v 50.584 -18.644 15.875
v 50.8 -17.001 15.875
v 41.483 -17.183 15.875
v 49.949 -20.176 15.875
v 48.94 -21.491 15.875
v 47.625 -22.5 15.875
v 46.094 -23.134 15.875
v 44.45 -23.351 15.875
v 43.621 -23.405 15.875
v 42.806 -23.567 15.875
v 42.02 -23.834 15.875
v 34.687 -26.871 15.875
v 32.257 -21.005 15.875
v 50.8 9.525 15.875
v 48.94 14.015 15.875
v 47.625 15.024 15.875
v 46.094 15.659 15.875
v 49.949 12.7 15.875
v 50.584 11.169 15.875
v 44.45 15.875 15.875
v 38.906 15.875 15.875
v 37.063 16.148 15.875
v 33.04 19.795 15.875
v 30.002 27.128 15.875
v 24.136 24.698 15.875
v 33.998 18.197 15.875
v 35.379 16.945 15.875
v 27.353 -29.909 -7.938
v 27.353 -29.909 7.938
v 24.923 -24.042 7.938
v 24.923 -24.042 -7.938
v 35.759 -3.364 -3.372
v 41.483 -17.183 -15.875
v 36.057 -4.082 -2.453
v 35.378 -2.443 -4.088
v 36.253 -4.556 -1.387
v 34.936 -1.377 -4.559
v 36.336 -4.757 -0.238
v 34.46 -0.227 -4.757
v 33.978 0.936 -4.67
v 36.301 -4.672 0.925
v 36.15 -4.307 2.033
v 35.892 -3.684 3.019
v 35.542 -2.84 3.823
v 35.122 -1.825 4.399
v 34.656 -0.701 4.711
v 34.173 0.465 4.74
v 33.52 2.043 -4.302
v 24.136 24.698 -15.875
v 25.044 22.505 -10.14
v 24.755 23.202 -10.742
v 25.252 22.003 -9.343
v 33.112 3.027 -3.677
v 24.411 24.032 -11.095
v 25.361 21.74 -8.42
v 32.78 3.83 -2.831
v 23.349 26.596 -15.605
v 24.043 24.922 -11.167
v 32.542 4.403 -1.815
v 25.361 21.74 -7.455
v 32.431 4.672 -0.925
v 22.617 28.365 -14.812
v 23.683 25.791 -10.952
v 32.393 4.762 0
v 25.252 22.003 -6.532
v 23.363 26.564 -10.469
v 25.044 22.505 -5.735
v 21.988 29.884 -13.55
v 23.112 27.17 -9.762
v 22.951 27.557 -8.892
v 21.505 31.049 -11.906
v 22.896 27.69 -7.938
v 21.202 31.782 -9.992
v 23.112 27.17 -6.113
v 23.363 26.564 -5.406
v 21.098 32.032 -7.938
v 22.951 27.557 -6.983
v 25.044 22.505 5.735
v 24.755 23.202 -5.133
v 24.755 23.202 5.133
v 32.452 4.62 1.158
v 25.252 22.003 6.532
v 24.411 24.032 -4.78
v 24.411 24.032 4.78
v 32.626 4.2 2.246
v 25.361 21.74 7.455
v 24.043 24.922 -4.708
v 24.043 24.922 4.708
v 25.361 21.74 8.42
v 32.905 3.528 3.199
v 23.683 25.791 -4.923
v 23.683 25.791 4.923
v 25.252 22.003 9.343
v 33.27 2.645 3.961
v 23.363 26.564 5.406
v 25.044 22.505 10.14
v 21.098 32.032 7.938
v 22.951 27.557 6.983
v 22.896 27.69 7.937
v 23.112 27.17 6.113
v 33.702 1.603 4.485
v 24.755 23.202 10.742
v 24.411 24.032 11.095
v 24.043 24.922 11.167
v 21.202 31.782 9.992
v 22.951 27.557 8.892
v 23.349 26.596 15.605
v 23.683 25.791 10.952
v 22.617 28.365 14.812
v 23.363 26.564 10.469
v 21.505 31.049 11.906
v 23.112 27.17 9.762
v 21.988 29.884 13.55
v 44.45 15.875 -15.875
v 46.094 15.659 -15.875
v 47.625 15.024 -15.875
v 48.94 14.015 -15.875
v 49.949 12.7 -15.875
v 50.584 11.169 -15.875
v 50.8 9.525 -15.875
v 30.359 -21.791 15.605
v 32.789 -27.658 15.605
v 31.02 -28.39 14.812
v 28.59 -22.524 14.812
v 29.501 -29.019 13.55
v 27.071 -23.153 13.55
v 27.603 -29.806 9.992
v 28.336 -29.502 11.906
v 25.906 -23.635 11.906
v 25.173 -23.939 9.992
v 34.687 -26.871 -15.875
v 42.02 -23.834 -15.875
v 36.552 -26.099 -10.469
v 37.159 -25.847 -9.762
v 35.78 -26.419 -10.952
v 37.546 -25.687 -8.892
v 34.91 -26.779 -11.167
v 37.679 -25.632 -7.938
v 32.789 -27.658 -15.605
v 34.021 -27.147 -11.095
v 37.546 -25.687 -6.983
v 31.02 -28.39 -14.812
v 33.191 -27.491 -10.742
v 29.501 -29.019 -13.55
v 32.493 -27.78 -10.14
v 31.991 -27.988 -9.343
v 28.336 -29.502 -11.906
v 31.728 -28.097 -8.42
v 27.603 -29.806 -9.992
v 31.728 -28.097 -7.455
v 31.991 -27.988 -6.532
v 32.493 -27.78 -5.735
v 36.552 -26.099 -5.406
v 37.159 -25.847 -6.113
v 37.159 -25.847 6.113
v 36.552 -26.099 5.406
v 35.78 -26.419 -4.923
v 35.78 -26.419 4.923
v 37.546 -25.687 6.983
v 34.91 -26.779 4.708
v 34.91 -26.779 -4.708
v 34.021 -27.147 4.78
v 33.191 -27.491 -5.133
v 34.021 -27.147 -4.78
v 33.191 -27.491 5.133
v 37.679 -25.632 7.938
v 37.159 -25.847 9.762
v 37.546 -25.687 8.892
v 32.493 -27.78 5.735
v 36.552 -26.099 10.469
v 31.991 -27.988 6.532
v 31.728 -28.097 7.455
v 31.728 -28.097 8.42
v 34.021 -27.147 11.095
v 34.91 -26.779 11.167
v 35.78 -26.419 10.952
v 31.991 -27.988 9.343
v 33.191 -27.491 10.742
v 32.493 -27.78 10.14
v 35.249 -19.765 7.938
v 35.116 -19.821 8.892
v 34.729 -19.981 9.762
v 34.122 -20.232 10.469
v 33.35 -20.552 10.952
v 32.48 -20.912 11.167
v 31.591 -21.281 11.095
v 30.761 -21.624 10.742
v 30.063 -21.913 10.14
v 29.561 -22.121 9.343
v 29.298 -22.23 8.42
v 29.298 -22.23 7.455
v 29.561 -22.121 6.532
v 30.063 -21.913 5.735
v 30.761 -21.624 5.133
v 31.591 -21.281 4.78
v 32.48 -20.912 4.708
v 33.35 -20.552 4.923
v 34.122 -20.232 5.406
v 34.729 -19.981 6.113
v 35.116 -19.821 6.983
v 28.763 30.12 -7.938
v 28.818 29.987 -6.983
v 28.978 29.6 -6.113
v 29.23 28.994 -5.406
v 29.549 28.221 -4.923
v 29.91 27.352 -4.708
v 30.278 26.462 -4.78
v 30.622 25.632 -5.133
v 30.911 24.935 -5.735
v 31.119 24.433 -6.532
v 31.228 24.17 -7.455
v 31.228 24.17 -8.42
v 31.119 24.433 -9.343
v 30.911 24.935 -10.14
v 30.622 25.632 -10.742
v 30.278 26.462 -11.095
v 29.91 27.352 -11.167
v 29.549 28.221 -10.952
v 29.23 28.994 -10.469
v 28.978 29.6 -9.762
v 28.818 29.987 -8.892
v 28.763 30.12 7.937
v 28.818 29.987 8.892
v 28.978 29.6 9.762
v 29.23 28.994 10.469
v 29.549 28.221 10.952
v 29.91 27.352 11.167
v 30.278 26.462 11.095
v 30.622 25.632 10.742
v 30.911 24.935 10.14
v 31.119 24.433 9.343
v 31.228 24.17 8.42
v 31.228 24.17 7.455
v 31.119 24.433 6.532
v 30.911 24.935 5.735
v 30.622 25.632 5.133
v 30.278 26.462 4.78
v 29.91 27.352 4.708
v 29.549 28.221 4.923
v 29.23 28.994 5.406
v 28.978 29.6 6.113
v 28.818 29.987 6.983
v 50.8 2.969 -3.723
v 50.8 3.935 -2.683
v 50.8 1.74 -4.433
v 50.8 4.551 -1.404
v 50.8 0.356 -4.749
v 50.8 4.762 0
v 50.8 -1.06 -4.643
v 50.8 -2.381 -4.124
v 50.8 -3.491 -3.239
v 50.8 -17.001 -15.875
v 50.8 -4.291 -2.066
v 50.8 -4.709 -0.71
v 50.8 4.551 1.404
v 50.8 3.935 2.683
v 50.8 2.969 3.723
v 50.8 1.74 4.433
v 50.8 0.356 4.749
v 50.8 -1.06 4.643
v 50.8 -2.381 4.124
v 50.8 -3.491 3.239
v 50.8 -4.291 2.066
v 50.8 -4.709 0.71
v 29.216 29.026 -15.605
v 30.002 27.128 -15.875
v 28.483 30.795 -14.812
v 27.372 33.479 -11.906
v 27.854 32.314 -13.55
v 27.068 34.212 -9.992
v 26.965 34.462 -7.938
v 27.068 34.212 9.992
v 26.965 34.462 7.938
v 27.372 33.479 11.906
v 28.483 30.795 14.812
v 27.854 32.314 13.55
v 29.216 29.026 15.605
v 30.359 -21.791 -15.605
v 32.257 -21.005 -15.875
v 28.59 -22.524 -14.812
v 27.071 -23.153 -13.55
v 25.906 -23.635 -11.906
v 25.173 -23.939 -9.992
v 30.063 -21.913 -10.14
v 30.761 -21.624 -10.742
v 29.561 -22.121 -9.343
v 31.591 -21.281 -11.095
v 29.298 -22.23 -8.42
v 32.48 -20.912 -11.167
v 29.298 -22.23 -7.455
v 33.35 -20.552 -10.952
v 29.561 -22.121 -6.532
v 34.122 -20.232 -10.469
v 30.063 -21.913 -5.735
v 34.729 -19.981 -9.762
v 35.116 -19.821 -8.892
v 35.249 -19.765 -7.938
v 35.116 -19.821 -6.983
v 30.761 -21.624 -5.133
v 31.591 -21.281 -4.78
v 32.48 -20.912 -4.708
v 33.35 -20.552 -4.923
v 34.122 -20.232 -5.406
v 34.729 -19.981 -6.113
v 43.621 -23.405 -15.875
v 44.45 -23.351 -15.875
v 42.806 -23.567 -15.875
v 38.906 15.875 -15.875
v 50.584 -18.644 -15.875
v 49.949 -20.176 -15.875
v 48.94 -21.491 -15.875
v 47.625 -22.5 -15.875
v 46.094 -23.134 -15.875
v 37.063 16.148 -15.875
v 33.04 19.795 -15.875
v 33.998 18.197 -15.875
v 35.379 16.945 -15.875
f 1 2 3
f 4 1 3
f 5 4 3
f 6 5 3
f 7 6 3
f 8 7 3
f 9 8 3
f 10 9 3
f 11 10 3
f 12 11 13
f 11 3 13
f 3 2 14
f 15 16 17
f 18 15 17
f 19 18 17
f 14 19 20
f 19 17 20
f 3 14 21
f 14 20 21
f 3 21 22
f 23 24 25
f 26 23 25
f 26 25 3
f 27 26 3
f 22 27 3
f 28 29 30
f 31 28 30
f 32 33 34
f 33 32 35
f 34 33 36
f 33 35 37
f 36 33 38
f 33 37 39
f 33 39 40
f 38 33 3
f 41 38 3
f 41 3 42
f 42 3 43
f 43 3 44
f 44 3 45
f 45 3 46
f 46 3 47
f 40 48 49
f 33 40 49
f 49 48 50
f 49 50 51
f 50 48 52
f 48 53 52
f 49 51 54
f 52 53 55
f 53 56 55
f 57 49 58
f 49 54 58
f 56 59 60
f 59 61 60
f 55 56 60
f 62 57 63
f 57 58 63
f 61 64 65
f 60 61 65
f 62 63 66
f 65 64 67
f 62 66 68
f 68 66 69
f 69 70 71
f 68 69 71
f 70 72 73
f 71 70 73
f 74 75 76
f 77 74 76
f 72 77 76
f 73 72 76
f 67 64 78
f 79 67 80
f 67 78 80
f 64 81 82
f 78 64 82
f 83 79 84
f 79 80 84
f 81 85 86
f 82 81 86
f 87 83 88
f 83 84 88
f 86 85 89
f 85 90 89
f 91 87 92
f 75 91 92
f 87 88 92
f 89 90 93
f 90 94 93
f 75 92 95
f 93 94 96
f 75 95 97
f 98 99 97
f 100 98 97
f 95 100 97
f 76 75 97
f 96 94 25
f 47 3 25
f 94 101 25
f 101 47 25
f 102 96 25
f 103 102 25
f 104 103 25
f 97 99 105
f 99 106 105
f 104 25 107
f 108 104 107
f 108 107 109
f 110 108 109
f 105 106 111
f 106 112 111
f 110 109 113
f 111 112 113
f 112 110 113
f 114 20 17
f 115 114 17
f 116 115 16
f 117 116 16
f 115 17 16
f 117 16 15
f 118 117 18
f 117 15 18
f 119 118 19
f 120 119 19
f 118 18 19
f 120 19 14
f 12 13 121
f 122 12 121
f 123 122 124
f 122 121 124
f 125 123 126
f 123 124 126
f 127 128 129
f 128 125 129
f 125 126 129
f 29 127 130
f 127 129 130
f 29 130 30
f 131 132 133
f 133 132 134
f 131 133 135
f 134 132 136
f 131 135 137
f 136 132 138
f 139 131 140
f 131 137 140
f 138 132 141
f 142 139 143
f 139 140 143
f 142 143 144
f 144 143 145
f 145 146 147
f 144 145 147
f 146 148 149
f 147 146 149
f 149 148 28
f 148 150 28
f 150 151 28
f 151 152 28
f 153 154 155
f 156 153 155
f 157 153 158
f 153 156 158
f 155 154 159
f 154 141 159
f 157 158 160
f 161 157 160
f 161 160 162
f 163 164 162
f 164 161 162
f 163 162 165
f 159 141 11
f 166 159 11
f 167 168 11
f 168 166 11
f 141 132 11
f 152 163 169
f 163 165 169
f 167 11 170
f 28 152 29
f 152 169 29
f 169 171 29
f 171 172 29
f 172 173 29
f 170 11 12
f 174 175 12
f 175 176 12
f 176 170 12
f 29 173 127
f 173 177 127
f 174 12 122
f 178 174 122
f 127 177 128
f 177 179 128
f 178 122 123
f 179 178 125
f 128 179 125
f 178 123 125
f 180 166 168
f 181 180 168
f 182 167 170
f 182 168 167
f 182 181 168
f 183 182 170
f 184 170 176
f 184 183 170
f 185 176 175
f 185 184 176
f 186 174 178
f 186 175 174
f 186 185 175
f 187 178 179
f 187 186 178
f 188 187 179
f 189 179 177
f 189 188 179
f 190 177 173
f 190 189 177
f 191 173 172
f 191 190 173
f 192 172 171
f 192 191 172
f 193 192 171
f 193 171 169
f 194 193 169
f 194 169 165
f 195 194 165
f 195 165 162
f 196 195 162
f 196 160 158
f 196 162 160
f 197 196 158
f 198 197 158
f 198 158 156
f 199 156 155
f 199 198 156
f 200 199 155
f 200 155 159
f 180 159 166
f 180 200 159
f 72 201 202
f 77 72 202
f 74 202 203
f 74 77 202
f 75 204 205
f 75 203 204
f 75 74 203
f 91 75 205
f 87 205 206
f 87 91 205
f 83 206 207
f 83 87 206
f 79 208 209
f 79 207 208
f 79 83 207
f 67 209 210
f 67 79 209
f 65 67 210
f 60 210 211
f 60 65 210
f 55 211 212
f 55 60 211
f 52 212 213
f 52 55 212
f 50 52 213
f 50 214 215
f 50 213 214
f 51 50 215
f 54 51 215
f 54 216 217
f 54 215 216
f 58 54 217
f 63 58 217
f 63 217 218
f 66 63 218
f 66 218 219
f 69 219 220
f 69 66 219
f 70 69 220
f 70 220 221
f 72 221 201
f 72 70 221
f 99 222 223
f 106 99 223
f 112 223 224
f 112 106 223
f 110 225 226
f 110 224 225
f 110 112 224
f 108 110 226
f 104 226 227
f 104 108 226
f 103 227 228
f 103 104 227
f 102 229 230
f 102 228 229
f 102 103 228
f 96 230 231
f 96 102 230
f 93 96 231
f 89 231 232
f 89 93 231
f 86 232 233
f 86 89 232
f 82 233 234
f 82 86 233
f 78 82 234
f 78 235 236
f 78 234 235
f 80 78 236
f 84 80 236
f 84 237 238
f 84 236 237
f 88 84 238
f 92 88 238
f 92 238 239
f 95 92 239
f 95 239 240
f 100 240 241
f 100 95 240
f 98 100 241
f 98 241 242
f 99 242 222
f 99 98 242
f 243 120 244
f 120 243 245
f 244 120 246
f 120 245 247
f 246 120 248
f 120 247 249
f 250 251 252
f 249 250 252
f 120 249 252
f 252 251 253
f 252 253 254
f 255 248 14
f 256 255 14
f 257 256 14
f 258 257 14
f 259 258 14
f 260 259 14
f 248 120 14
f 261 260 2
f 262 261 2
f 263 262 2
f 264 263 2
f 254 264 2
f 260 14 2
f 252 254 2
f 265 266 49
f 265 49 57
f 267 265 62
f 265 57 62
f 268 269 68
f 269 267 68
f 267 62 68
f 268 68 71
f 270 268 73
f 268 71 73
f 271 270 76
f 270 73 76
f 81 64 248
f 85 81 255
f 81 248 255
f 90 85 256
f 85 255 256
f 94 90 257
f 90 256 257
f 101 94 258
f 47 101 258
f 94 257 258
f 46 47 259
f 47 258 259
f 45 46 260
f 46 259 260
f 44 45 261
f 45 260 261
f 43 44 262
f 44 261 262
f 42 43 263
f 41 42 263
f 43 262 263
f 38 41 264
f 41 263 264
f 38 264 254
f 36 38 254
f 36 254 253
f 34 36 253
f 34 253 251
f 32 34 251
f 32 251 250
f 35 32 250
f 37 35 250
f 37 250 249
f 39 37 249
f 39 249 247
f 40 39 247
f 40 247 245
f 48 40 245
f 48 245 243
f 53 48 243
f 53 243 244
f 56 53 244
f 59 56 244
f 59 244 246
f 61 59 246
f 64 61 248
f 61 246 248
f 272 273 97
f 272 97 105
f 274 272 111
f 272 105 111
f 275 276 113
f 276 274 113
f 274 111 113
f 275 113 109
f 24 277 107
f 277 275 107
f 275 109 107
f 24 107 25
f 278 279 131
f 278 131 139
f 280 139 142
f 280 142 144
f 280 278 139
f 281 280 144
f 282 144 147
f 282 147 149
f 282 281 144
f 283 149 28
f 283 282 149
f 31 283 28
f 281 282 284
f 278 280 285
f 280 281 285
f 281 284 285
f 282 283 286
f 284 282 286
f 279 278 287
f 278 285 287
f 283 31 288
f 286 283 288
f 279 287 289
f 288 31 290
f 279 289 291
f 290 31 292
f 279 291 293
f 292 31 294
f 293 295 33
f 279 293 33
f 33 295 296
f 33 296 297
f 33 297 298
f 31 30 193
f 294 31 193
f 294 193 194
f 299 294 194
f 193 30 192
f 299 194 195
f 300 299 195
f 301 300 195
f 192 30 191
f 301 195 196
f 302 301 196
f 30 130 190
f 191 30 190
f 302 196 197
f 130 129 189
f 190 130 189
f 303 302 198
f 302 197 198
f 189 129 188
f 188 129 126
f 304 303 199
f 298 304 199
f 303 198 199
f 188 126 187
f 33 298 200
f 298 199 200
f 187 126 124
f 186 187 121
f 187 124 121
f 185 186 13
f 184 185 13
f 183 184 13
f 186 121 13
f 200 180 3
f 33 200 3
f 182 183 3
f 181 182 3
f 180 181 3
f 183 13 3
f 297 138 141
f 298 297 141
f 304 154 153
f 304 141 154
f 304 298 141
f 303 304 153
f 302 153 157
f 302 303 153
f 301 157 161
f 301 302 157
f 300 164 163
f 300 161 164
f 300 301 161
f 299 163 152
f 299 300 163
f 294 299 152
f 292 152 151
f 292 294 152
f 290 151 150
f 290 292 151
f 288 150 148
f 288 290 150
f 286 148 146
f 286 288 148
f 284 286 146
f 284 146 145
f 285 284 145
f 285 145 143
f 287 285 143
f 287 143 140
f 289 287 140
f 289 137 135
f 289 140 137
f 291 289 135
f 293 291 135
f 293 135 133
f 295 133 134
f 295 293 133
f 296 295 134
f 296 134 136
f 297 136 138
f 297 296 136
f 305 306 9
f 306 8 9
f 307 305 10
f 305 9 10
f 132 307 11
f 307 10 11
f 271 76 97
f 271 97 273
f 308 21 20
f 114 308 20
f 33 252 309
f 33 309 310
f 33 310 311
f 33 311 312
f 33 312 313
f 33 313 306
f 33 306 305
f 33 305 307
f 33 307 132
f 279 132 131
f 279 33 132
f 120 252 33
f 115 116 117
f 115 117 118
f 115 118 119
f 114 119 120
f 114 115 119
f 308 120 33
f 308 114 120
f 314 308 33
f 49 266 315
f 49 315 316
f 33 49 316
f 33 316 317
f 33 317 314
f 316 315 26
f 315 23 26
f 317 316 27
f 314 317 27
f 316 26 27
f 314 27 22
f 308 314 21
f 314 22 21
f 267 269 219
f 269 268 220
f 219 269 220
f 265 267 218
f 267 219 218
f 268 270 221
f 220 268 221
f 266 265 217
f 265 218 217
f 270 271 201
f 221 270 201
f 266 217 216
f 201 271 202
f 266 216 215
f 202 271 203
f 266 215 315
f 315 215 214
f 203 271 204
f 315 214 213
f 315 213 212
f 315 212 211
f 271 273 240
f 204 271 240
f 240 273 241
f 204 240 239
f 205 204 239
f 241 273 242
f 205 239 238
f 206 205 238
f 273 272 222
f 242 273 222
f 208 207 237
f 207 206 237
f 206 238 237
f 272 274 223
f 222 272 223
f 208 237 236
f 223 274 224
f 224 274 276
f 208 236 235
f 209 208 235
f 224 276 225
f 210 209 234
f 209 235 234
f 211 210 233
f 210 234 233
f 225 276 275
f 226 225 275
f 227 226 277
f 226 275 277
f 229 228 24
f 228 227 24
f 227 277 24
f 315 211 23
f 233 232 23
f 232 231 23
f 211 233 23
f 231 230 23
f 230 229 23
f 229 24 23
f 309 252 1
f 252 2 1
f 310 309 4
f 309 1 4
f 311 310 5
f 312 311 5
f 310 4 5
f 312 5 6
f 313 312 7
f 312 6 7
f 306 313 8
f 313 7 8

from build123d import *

# Parameters (mm, degrees)
BOSS_EXTRUDE1_DEPTH     = 15.875
CUT_EXTRUDE1_DEPTH      = 50.746098851
CUT_EXTRUDE1_DEPTH_BACK = 50.746098851
SKETCH3_R               = 3.2385
CUT_EXTRUDE2_DEPTH      = 81.103629898
CUT_EXTRUDE2_DEPTH_BACK = 81.103629898
SKETCH4_R               = 3.2385
SKETCH5_R               = 4.7625
CUT_EXTRUDE3_DEPTH      = 49.185254021


with BuildPart() as part:
    # Sketch1 → Boss-Extrude1 (new, symmetric)
    with BuildSketch(Plane.XY):
        with BuildLine():
            Line((50.8, 9.525), (50.8, -17.000540456))
            ThreePointArc((50.8, -17.000540456), (48.940128061, -21.490668516), (44.45, -23.350540456))
            ThreePointArc((44.45, -23.350540456), (43.211176455, -23.472553925), (42.019960204, -23.833905424))
            Line((42.019960204, -23.833905424), (27.353372626, -29.909004913))
            Line((27.353372626, -29.909004913), (24.92333283, -24.042369881))
            Line((24.92333283, -24.042369881), (41.483374135, -17.18297618))
            Line((41.483374135, -17.18297618), (21.098067328, 32.031507988))
            Line((21.098067328, 32.031507988), (26.964702359, 34.461547783))
            Line((26.964702359, 34.461547783), (33.039801848, 19.794960204))
            ThreePointArc((33.039801848, 19.794960204), (35.3785659, 16.945167962), (38.906436879, 15.875))
            Line((38.906436879, 15.875), (44.45, 15.875))
            ThreePointArc((44.45, 15.875), (48.940128061, 14.015128061), (50.8, 9.525))
        make_face()
    extrude(amount=BOSS_EXTRUDE1_DEPTH, both=True)

    # Sketch3 → Cut-Extrude1 (cut, two sides: drawn at the far end of the back side and taken through both)
    with BuildSketch(Plane(origin=(35.199810189, 14.580238773, 0), x_dir=(0, 0, -1), z_dir=(0.9238795325112886, 0.3826834323650853, 0)).offset(-CUT_EXTRUDE1_DEPTH_BACK)):
        with Locations((-7.9375, 13.581873804)):
            Circle(SKETCH3_R)
        with Locations((7.9375, 13.581873804)):
            Circle(SKETCH3_R)
        with BuildLine():
            Line((-15.875, 13.581873804), (-15.875, 21.519373804))
            Line((-15.875, 21.519373804), (-7.9375, 21.519373804))
            ThreePointArc((-7.9375, 21.519373804), (-13.550160076, 19.19453388), (-15.875, 13.581873804))
        make_face()
        with BuildLine():
            Line((7.9375, 21.519373804), (15.875, 21.519373804))
            Line((15.875, 21.519373804), (15.875, 13.581873804))
            ThreePointArc((15.875, 13.581873804), (13.550160076, 19.19453388), (7.9375, 21.519373804))
        make_face()
    extrude(amount=CUT_EXTRUDE1_DEPTH + CUT_EXTRUDE1_DEPTH_BACK, mode=Mode.SUBTRACT)

    # Sketch4 → Cut-Extrude2 (cut, two sides: drawn at the far end of the back side and taken through both)
    with BuildSketch(Plane(origin=(14.580238773, -35.199810189, 0), x_dir=(-0.9238795325112892, -0.3826834323650842, 0), z_dir=(0.3826834323650842, -0.9238795325112892, 0)).offset(-CUT_EXTRUDE2_DEPTH_BACK)):
        with Locations((-21.763040456, -7.9375)):
            Circle(SKETCH4_R)
        with Locations((-21.763040456, 7.9375)):
            Circle(SKETCH4_R)
        with BuildLine():
            Line((-13.825540456, -7.9375), (-13.825540456, -15.875))
            Line((-13.825540456, -15.875), (-21.763040456, -15.875))
            ThreePointArc((-21.763040456, -15.875), (-16.15038038, -13.550160076), (-13.825540456, -7.9375))
        make_face()
        with BuildLine():
            Line((-13.825540456, 7.9375), (-13.825540456, 15.875))
            Line((-13.825540456, 15.875), (-21.763040456, 15.875))
            ThreePointArc((-21.763040456, 15.875), (-16.15038038, 13.550160076), (-13.825540456, 7.9375))
        make_face()
    extrude(amount=CUT_EXTRUDE2_DEPTH + CUT_EXTRUDE2_DEPTH_BACK, mode=Mode.SUBTRACT)

    # Sketch5 → Cut-Extrude3 (cut, through all)
    with BuildSketch(Plane(origin=(50.8, 0, 0), x_dir=(0, 0, -1), z_dir=(1, 0, 0))):
        Circle(SKETCH5_R)
    extrude(amount=-CUT_EXTRUDE3_DEPTH, mode=Mode.SUBTRACT)


solid = part.part
